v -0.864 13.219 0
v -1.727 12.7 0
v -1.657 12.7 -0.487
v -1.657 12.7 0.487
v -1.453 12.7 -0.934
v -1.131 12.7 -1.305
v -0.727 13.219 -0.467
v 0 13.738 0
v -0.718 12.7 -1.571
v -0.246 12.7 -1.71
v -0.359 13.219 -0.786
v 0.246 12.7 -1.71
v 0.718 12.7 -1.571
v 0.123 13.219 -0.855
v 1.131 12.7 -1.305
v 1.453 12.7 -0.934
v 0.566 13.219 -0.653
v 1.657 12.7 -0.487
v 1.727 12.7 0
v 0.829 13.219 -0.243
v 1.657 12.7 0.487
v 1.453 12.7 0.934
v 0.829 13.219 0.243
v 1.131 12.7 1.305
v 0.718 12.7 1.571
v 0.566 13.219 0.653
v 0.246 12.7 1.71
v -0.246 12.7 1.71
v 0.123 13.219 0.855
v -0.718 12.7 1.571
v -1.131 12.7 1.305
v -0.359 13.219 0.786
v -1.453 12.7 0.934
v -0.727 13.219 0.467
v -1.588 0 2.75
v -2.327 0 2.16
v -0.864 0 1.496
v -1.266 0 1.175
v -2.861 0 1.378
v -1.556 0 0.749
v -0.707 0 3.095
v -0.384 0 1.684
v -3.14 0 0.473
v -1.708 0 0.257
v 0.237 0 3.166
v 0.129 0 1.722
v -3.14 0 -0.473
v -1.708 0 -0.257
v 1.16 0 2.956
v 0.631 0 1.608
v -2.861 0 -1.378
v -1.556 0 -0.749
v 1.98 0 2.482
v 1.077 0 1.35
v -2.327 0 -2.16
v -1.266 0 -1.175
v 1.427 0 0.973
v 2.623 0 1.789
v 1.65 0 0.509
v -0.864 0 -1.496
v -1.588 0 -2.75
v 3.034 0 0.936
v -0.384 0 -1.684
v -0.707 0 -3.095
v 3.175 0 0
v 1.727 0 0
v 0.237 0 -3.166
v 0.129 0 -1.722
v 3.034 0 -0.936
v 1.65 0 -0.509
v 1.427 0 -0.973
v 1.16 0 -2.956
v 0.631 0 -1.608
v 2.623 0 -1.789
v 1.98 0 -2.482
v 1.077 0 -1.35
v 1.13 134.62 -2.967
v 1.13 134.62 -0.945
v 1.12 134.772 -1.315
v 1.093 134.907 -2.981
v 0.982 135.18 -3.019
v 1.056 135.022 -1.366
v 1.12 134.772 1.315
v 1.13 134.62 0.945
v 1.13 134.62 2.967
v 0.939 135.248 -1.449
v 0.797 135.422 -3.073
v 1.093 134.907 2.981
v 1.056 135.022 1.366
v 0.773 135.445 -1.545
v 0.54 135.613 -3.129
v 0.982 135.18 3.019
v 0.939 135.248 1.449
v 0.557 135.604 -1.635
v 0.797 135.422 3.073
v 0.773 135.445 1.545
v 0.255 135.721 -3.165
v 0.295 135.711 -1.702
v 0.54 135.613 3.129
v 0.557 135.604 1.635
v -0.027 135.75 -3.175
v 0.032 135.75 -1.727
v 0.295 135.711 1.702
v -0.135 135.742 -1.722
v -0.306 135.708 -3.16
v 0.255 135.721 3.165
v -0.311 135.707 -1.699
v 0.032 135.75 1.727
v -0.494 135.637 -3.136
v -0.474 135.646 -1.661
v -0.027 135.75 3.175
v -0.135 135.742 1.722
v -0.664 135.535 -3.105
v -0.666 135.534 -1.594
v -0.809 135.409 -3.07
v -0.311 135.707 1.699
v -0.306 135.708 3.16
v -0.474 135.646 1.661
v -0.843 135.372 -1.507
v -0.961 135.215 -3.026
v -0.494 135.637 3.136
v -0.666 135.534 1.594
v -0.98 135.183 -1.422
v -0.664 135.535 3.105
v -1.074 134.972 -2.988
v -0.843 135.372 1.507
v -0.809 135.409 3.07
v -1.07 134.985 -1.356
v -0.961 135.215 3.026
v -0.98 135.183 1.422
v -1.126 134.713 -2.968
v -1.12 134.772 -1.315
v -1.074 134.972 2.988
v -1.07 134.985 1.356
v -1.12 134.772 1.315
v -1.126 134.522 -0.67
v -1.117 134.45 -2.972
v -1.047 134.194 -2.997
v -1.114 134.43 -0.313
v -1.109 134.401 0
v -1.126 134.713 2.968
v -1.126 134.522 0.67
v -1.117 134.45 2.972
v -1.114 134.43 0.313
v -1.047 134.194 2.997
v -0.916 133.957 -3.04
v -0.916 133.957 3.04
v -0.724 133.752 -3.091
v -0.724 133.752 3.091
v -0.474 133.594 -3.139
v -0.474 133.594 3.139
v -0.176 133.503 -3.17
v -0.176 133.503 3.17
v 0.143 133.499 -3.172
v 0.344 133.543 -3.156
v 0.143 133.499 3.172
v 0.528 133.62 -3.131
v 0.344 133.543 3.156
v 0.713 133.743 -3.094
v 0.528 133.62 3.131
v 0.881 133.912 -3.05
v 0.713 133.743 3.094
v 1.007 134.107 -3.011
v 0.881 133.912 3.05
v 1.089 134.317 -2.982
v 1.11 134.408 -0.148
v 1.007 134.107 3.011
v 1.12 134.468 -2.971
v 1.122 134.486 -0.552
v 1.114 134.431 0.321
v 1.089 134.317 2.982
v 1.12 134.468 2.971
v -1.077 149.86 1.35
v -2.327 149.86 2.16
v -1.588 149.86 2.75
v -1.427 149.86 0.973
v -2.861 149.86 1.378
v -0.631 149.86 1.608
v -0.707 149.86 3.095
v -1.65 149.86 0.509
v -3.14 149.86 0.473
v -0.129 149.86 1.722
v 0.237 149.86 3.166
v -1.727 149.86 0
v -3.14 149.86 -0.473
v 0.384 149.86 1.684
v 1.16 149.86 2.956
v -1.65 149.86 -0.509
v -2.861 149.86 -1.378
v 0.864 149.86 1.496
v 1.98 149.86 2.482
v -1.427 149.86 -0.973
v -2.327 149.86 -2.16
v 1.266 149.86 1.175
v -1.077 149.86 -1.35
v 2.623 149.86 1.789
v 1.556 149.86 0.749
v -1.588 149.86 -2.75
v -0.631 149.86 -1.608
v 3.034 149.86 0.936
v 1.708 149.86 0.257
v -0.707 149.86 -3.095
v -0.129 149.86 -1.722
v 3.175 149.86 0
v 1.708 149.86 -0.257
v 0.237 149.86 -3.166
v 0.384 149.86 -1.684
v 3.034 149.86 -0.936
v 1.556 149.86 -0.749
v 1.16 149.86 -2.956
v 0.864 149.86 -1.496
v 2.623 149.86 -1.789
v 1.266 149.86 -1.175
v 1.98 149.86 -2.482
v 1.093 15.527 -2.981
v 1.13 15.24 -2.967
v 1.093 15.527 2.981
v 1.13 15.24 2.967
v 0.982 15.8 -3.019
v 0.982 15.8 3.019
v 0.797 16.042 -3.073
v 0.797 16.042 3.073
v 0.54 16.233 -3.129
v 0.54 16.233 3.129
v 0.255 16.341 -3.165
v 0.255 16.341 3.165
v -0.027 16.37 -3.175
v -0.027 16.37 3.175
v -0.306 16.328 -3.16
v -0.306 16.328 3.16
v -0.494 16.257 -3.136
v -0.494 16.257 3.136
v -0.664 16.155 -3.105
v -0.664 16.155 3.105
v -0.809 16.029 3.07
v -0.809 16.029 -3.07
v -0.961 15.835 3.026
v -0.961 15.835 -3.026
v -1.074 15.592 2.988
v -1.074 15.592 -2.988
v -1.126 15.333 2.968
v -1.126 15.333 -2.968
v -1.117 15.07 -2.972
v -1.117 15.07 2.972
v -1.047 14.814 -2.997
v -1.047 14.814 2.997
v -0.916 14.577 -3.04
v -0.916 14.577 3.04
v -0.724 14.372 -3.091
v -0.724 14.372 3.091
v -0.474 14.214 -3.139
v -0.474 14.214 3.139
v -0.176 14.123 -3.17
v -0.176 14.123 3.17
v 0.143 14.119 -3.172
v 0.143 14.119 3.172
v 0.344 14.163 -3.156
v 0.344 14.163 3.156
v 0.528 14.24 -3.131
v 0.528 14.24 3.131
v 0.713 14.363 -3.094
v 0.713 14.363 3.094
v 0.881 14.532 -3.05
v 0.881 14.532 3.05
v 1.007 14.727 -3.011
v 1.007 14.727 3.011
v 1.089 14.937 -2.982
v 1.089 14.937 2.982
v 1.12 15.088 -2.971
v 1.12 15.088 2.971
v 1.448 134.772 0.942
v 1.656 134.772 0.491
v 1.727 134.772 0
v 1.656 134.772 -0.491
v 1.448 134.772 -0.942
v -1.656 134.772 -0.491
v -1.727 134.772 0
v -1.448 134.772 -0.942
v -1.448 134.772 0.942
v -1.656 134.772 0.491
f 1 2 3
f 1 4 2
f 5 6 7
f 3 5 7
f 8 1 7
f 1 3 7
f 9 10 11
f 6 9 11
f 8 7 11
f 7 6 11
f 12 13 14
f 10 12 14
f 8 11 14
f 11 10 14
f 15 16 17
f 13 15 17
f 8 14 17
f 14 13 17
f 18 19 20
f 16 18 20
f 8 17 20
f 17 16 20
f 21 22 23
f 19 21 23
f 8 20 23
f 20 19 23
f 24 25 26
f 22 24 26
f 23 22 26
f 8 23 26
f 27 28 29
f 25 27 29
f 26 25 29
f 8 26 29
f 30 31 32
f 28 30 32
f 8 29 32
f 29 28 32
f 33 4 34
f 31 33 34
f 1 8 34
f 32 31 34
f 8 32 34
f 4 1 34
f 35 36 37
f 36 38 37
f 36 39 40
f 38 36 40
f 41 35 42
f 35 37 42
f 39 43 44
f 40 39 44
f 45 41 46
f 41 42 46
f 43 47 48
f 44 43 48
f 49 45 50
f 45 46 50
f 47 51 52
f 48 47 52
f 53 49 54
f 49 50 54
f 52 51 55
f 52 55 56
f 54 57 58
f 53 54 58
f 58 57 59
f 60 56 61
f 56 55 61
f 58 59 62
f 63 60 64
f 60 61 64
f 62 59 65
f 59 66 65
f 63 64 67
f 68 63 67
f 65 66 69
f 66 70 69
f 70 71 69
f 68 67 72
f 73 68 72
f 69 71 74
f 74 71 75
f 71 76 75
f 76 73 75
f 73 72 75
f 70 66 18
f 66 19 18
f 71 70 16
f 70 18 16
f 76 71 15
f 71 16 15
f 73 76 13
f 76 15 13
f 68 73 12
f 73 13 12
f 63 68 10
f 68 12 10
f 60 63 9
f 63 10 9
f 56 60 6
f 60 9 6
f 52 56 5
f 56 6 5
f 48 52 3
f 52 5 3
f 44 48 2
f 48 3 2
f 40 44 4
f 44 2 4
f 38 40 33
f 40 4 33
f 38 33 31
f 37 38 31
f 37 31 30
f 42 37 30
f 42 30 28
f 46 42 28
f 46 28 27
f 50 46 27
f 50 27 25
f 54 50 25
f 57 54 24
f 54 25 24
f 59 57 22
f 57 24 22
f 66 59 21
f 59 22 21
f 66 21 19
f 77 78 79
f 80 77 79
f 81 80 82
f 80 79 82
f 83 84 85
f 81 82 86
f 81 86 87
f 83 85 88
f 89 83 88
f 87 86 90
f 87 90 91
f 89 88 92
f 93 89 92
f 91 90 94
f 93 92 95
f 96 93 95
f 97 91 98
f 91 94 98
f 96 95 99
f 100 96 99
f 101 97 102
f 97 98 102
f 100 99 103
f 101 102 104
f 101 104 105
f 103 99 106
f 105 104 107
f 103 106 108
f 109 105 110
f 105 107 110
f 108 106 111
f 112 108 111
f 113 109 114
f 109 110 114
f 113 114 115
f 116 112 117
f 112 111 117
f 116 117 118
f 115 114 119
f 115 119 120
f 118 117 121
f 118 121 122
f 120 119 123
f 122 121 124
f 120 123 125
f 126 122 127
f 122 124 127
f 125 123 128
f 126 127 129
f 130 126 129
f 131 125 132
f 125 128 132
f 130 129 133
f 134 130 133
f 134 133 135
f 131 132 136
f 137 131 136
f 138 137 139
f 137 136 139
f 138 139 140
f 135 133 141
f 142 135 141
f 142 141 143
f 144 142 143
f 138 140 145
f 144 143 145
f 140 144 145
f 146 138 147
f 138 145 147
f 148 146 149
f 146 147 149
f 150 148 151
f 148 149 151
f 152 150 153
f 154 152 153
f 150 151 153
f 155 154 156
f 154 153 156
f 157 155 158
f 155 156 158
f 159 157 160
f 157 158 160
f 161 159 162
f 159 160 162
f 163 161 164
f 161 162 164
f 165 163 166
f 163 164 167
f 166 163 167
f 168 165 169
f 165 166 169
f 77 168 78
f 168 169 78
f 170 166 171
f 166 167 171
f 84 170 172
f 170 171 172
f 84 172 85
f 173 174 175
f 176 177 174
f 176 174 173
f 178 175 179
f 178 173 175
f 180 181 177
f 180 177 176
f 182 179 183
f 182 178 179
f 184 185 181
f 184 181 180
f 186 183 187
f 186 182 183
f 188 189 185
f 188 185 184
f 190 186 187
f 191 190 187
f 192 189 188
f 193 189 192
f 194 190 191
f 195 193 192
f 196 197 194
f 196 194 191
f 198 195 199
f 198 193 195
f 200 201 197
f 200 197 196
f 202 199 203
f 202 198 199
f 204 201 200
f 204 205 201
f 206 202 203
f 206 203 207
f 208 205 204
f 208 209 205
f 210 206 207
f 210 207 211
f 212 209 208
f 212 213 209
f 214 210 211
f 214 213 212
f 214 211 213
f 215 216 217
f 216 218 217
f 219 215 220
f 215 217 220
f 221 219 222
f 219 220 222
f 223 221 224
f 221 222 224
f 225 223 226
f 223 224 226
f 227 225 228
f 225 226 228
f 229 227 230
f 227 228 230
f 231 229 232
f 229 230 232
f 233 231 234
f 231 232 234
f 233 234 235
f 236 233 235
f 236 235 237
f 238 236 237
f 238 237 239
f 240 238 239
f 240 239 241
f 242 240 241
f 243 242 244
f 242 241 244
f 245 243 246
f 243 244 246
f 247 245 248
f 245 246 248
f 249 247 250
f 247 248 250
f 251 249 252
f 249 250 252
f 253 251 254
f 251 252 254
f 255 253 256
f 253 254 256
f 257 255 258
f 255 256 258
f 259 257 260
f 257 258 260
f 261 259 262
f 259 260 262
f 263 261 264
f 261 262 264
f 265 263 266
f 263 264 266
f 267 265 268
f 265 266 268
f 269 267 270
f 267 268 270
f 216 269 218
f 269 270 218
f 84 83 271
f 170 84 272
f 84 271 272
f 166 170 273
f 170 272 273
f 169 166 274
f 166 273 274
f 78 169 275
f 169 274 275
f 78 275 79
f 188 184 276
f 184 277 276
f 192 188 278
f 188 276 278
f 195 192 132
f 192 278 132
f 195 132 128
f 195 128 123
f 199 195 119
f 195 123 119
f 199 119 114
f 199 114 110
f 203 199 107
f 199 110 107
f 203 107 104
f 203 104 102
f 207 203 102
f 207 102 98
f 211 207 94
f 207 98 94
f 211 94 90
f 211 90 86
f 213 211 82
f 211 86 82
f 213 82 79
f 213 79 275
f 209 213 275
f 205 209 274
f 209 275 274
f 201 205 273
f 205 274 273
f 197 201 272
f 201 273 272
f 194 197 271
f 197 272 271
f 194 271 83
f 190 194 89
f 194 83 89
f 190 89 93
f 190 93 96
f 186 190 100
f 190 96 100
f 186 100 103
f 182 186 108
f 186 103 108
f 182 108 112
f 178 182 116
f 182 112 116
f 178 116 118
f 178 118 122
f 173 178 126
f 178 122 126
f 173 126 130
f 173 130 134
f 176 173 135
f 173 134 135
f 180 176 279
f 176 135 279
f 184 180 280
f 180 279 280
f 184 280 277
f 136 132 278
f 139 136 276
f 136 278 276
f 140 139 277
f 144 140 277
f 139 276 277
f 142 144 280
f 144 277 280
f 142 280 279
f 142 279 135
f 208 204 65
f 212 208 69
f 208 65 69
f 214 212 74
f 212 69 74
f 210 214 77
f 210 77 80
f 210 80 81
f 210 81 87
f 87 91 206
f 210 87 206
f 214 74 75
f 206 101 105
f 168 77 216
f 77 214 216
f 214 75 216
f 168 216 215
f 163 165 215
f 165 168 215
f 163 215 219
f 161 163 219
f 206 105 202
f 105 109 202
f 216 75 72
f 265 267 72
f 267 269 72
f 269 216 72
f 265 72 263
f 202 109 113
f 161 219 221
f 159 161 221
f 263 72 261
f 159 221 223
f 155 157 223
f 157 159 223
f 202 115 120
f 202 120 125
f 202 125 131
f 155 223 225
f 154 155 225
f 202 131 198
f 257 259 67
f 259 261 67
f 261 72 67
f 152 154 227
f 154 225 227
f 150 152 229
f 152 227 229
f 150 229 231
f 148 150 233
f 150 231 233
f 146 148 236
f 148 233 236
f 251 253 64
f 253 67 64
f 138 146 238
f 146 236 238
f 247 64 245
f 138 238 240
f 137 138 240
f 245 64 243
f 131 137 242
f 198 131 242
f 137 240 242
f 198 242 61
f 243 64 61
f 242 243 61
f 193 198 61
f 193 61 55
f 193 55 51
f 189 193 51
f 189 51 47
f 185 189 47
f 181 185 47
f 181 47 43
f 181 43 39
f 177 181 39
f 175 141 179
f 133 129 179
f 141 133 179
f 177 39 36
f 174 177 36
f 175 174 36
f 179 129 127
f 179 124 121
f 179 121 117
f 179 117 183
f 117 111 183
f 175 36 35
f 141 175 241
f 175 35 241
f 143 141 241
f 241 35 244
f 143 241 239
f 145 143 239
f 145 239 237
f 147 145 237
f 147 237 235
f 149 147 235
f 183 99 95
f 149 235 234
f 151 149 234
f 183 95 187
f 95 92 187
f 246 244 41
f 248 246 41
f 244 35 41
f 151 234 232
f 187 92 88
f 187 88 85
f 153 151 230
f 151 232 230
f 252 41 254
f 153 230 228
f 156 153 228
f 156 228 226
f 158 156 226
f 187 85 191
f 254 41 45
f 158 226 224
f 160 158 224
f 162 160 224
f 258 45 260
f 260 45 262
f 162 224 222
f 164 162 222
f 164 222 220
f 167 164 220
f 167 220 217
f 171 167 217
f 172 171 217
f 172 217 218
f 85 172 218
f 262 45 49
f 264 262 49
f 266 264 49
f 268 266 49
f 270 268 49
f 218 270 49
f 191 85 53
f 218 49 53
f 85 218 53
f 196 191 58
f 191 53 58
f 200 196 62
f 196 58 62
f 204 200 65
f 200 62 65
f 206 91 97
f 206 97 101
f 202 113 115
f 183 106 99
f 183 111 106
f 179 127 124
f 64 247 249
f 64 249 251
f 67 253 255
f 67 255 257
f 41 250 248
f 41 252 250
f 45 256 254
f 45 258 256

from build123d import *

# Parameters (mm, degrees)
SKETCH1_R                 = 3.175
BOSS_EXTRUDE1_DEPTH       = 149.86
F_8_32_TAPPED_HOLE1_D     = 3.4544
F_8_32_TAPPED_HOLE1_DEPTH = 12.7
F_8_32_TAPPED_HOLE1_TIP   = 1.037806461
F_8_32_TAPPED_HOLE2_D     = 3.4544
F_8_32_TAPPED_HOLE2_DEPTH = 15.0876
F_8_32_TAPPED_HOLE2_TIP   = 1.037806461
SKETCH6_R                 = 1.1303
CUT_EXTRUDE1_DEPTH        = 4.175
CUT_EXTRUDE1_DEPTH_BACK   = 4.175


with BuildPart() as part:
    # Sketch1 → Boss-Extrude1 (new body)
    with BuildSketch(Plane(origin=(0, 0, 0), x_dir=(1, 0, 0), z_dir=(0, 1, 0))):
        Circle(SKETCH1_R)
    extrude(amount=BOSS_EXTRUDE1_DEPTH)

    # #8-32 Tapped Hole1
    with Locations(Plane(origin=(0, 0, 0), x_dir=(-1, 0, 0), z_dir=(0, -1, 0))):
        with Locations((0, 0)):
            Hole(F_8_32_TAPPED_HOLE1_D / 2, depth=F_8_32_TAPPED_HOLE1_DEPTH)
            with Locations((0, 0, -(F_8_32_TAPPED_HOLE1_DEPTH + F_8_32_TAPPED_HOLE1_TIP / 2))):  # 118° drill point
                Cone(0, F_8_32_TAPPED_HOLE1_D / 2, F_8_32_TAPPED_HOLE1_TIP, mode=Mode.SUBTRACT)

    # #8-32 Tapped Hole2
    with Locations(Plane(origin=(0, 149.86, 0), x_dir=(1, 0, 0), z_dir=(0, 1, 0))):
        with Locations((0, 0)):
            Hole(F_8_32_TAPPED_HOLE2_D / 2, depth=F_8_32_TAPPED_HOLE2_DEPTH)
            with Locations((0, 0, -(F_8_32_TAPPED_HOLE2_DEPTH + F_8_32_TAPPED_HOLE2_TIP / 2))):  # 118° drill point
                Cone(0, F_8_32_TAPPED_HOLE2_D / 2, F_8_32_TAPPED_HOLE2_TIP, mode=Mode.SUBTRACT)

    # Sketch6 → Cut-Extrude1 (cut, two sides)
    with BuildSketch(Plane.XY) as cut_extrude1_sk:
        with Locations((0, 134.62)):
            Circle(SKETCH6_R)
        with Locations((0, 15.24)):
            Circle(SKETCH6_R)
    extrude(amount=CUT_EXTRUDE1_DEPTH, mode=Mode.SUBTRACT)
    extrude(cut_extrude1_sk.sketch, amount=-CUT_EXTRUDE1_DEPTH_BACK, mode=Mode.SUBTRACT)


solid = part.part
